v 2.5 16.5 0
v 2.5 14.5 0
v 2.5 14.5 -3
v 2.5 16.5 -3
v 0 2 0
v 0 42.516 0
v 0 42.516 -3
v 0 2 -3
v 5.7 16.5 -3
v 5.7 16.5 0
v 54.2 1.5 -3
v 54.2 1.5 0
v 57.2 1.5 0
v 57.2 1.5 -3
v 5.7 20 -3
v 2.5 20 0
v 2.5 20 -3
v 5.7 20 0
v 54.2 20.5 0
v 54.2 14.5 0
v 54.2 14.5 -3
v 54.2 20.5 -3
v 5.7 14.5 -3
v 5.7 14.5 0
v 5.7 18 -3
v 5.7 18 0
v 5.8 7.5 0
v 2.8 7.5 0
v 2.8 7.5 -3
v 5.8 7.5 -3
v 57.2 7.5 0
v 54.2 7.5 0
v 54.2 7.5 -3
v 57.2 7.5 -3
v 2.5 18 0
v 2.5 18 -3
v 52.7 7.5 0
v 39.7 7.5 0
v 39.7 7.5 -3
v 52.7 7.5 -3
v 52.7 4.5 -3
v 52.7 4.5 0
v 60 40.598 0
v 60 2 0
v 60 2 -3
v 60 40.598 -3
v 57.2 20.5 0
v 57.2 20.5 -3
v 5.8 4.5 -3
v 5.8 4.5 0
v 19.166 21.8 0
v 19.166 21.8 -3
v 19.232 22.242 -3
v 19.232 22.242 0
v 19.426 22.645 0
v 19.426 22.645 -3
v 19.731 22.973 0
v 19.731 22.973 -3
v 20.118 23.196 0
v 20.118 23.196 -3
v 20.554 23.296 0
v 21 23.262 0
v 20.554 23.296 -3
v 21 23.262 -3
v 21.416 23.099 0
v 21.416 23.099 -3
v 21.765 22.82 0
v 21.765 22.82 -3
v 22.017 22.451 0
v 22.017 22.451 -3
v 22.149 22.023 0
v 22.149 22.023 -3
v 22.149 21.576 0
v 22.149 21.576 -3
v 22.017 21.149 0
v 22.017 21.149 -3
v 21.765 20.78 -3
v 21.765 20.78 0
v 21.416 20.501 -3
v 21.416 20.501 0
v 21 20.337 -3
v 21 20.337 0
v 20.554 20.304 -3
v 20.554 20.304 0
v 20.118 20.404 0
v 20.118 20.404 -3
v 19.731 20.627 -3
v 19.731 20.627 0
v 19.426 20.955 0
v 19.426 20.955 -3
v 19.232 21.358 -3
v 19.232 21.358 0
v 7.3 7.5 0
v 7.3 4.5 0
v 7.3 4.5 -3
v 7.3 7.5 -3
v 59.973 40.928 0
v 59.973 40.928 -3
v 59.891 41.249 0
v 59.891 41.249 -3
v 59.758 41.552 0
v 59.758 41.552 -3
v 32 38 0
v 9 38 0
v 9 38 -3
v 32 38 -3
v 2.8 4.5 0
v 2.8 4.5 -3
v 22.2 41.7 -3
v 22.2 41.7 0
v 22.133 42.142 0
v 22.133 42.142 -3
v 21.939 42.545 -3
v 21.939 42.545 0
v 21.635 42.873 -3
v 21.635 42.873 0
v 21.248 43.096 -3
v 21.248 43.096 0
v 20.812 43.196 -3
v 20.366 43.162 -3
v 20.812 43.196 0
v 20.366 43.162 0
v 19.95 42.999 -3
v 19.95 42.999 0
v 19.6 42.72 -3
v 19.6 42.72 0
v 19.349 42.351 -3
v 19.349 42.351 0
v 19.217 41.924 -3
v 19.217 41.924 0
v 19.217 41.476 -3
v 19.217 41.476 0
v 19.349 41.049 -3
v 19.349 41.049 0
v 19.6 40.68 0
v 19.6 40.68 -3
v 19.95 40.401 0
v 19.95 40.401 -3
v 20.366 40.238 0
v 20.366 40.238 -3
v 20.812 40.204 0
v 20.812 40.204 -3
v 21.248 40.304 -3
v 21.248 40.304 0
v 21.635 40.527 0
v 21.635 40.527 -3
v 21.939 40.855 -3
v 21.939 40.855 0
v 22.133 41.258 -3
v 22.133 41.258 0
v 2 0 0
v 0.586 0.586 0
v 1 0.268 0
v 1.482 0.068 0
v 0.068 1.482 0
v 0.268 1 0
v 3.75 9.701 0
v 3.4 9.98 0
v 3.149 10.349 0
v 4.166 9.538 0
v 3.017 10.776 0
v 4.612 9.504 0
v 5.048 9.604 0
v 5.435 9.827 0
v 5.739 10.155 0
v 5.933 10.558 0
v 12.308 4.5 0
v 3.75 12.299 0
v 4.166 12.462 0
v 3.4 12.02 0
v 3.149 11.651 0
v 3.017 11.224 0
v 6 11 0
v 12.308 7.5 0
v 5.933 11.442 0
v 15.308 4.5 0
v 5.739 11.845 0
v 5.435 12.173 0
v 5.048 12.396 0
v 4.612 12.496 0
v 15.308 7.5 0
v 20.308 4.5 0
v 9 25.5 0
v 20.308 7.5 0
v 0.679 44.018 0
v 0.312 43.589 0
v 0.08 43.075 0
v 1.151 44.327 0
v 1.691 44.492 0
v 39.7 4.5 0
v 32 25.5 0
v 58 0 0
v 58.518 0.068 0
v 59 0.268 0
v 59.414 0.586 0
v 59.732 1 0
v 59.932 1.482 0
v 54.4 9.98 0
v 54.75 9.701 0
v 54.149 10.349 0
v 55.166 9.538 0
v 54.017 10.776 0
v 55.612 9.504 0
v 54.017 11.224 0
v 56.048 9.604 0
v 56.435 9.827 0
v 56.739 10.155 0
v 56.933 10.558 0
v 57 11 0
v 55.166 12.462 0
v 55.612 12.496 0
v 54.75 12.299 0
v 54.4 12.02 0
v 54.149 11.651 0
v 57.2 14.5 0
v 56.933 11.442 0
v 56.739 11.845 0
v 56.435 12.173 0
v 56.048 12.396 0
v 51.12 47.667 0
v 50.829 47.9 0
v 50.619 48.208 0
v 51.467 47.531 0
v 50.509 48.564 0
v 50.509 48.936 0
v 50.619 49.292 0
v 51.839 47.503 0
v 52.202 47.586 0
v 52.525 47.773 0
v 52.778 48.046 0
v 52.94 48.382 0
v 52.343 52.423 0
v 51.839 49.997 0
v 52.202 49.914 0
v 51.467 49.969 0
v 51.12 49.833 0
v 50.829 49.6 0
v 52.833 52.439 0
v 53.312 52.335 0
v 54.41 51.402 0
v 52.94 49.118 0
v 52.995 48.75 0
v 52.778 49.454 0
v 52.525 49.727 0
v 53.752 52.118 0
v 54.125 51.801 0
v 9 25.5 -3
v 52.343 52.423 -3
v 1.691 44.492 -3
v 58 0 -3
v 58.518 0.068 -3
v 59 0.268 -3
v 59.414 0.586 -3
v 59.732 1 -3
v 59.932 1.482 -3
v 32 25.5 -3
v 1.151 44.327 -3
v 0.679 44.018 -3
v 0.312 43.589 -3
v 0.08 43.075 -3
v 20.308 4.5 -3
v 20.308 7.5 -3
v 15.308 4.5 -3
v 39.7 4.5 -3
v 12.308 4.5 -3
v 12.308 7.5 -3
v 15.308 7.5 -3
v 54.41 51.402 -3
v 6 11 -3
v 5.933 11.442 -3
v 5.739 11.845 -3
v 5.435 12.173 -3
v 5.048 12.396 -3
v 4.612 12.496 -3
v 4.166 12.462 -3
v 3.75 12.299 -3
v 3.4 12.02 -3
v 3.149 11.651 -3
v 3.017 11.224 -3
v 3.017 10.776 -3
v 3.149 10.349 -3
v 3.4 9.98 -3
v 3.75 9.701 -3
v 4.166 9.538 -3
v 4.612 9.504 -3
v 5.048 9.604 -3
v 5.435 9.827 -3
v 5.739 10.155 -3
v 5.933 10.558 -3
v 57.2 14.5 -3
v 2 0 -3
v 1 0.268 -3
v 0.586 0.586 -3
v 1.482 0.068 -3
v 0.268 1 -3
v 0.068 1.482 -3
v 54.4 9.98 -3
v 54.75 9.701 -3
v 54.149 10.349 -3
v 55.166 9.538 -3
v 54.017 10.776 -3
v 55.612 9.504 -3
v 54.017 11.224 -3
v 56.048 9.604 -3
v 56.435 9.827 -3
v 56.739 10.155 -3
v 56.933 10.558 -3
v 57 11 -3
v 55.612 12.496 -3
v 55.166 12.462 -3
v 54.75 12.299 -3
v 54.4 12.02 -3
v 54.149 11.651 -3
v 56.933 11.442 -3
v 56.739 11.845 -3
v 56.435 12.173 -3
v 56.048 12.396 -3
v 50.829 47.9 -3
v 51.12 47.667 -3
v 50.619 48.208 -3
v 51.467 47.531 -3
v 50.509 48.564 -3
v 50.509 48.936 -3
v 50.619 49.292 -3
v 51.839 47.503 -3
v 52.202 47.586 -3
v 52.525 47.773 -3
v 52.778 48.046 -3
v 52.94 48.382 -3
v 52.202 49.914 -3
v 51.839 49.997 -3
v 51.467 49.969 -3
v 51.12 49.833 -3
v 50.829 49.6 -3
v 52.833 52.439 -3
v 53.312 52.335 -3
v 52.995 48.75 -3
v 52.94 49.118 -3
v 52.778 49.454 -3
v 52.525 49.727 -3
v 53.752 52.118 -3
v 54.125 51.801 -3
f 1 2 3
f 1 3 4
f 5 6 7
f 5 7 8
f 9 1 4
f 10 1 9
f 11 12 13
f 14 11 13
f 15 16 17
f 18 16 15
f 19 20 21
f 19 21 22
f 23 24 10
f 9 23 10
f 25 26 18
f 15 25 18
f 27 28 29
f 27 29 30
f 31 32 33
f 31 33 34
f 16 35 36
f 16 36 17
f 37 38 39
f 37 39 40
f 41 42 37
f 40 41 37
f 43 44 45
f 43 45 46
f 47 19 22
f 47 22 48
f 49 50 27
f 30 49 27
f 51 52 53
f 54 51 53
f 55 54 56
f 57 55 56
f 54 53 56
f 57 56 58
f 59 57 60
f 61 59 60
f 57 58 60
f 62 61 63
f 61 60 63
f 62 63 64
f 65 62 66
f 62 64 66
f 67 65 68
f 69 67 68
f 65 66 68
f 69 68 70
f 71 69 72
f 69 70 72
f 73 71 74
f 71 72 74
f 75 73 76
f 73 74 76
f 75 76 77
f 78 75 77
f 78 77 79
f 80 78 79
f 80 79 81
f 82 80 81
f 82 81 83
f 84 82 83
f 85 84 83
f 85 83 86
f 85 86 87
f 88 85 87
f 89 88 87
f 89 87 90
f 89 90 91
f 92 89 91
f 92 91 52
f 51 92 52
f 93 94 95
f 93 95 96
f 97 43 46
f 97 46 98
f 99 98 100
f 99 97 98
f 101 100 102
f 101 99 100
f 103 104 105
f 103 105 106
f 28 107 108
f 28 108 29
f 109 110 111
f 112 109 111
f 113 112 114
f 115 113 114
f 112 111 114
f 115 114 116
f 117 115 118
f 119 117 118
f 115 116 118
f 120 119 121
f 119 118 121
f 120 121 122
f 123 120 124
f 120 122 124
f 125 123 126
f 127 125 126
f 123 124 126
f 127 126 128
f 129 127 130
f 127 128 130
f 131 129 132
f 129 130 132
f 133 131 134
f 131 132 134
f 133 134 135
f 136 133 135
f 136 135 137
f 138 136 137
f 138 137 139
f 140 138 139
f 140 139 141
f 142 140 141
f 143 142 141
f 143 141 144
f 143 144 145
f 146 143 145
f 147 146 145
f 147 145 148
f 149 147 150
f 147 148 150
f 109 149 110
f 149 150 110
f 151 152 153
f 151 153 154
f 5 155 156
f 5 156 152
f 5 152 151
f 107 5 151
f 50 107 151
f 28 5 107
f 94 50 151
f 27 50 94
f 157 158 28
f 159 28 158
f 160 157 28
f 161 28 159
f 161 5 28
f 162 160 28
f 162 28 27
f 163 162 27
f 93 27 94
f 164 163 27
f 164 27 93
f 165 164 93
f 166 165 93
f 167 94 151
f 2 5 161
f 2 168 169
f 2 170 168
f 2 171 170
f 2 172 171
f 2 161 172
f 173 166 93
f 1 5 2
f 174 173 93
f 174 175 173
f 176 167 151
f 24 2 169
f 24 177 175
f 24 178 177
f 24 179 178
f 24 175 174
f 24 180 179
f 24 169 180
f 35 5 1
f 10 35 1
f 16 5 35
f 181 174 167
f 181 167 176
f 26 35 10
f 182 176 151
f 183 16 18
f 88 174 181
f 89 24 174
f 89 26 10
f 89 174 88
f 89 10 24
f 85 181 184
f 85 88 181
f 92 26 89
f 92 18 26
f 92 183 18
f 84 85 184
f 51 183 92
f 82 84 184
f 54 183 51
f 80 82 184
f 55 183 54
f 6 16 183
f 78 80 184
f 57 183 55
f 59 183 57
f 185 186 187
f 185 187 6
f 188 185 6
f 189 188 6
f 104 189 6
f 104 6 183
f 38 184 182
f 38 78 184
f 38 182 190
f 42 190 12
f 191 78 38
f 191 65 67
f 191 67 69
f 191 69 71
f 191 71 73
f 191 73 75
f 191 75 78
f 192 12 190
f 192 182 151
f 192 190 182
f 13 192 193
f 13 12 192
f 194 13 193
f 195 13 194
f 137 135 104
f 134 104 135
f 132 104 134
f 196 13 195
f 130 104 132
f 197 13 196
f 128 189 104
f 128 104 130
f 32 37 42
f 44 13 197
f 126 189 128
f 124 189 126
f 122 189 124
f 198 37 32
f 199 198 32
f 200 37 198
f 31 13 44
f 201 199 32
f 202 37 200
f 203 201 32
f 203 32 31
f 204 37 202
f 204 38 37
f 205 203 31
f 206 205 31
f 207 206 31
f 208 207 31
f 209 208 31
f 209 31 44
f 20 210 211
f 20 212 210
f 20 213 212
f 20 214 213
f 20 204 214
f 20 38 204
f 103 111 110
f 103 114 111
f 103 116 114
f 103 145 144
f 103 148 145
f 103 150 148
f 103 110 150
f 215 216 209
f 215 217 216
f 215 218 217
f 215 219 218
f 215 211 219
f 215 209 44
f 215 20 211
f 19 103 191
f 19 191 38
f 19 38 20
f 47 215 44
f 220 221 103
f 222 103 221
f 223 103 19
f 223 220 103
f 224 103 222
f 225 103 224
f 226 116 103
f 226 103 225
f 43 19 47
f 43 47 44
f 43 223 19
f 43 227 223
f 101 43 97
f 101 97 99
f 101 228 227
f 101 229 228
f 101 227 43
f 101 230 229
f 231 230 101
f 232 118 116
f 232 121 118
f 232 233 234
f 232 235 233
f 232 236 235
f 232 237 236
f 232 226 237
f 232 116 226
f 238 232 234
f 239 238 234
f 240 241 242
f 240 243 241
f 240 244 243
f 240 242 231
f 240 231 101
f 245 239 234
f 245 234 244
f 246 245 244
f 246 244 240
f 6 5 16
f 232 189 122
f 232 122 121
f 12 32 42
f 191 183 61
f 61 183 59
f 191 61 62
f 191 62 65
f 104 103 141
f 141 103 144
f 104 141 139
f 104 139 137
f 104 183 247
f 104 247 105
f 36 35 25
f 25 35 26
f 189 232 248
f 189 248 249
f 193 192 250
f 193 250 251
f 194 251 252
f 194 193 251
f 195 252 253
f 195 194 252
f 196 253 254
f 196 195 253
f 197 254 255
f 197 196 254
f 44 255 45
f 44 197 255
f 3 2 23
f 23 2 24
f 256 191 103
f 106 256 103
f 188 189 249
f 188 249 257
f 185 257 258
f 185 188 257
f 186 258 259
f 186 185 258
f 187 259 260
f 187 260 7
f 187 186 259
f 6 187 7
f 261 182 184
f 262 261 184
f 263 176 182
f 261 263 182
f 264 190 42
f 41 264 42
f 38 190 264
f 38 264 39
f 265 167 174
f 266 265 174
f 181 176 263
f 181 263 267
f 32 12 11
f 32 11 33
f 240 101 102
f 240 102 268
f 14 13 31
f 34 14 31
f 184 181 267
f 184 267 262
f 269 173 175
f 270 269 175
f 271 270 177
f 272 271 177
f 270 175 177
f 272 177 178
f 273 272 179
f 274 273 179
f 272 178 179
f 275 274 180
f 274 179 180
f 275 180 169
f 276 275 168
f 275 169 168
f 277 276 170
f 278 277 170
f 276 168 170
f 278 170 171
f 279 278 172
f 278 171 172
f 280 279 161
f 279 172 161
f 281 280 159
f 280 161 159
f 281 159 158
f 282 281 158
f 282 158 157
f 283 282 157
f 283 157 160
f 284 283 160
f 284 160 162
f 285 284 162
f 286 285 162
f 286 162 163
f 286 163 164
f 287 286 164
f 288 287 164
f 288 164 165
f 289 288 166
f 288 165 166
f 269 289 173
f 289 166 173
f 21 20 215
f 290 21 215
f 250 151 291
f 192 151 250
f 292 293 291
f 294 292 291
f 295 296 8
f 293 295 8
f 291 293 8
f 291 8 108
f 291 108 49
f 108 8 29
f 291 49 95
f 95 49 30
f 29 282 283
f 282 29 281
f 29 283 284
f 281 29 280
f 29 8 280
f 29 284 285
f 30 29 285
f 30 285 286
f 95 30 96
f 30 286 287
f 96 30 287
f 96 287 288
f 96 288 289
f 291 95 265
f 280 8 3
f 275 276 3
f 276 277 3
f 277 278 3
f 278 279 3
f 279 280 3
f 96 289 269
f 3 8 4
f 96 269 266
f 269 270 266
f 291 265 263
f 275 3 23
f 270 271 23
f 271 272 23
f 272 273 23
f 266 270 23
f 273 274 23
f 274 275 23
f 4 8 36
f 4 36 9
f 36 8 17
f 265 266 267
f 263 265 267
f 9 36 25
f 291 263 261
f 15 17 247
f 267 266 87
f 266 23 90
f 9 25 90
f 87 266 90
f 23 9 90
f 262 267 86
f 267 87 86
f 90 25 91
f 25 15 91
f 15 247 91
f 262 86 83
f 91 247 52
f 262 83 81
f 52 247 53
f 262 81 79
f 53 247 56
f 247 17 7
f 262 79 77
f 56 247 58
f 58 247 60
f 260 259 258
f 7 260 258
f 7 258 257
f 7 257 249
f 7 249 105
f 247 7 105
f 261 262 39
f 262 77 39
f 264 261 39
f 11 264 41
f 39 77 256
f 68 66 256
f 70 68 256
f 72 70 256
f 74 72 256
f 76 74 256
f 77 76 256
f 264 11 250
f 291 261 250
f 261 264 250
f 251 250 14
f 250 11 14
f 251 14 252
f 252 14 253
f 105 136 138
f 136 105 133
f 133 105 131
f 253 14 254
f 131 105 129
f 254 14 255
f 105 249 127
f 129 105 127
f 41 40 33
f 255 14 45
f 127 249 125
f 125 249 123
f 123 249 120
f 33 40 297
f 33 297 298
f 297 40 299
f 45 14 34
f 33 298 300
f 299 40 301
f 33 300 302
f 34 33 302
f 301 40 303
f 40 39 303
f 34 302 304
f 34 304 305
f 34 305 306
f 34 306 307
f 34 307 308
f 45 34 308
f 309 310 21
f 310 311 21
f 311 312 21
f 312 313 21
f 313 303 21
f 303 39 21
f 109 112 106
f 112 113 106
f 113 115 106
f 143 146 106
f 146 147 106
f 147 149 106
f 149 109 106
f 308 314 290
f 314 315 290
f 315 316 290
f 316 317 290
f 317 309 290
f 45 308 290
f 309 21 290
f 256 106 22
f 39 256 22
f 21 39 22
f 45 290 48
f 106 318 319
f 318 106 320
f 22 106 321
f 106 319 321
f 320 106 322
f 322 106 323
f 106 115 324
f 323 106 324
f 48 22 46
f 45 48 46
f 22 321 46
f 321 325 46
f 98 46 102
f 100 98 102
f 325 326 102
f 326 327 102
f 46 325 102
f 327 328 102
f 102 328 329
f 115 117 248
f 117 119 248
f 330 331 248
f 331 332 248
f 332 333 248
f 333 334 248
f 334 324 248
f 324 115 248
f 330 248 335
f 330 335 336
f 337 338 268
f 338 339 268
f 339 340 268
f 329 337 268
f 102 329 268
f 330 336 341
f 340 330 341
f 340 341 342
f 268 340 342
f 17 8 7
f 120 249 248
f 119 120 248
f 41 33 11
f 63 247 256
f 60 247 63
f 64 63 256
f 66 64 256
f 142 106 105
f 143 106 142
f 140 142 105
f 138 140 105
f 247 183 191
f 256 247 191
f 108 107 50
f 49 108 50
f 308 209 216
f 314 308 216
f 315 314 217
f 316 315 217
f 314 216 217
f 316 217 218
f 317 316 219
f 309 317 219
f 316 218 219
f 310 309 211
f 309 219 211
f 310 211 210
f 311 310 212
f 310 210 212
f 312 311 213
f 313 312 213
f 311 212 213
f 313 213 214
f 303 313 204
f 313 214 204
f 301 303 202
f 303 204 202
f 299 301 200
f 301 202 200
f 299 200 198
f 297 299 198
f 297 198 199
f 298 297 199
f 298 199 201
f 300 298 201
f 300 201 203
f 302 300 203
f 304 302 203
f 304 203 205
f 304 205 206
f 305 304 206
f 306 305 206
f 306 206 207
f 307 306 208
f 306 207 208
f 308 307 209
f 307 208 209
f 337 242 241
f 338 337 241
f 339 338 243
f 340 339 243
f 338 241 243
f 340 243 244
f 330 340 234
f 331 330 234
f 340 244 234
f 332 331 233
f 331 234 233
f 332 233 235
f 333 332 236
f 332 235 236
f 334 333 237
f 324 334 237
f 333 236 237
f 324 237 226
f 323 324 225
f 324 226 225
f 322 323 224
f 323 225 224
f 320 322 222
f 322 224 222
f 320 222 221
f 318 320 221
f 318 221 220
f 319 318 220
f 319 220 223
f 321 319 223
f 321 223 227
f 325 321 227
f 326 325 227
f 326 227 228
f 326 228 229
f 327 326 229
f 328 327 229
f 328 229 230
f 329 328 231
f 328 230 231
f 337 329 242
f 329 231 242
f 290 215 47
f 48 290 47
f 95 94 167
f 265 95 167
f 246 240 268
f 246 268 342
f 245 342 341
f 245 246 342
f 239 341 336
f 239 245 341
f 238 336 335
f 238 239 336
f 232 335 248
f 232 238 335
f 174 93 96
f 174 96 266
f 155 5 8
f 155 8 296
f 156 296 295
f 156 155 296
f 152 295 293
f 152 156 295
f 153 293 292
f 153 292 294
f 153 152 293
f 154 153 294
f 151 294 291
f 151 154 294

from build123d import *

# Parameters (mm, degrees)
ESQUISSE1_R               = 1.25
ESQUISSE1_R_2             = 1.5
ESQUISSE1_W               = 23
ESQUISSE1_H               = 12.5
ESQUISSE1_W_2             = 13
ESQUISSE1_H_2             = 3
ESQUISSE1_W_3             = 3
ESQUISSE1_H_3             = 6
ESQUISSE1_W_4             = 5
ESQUISSE1_W_5             = 5.008466432
ESQUISSE1_W_6             = 3.2
ESQUISSE1_H_4             = 2
T_LE_DE_BASE_PLI_E1_DEPTH = 3
ESQUISSE2_R               = 1.5
ENL_V_MAT_EXTRU_1_DEPTH   = 10


# Sheet-metal steps are written as plain solids
with BuildPart() as part:
    # Esquisse1 → Tôle de base pliée1 (new body)
    with BuildSketch(Plane.XY):
        with BuildLine():
            Line((0, 42.516223037), (0, 2))
            ThreePointArc((0, 2), (0.585786438, 0.585786438), (2, 0))
            Line((2, 0), (58, 0))
            ThreePointArc((58, 0), (59.414213562, 0.585786438), (60, 2))
            Line((60, 2), (60, 40.598160001))
            ThreePointArc((60, 40.598160001), (59.938461819, 41.090466587), (59.757634225, 41.552477522))
            Line((59.757634225, 41.552477522), (54.409971269, 51.401647463))
            ThreePointArc((54.409971269, 51.401647463), (53.538493891, 52.240295654), (52.342948156, 52.423254667))
            Line((52.342948156, 52.423254667), (1.690611112, 44.492147761))
            ThreePointArc((1.690611112, 44.492147761), (0.480332639, 43.816458059), (0, 42.516223037))
        make_face()
        with Locations((51.745273693, 48.75)):
            Circle(ESQUISSE1_R, mode=Mode.SUBTRACT)
        with Locations((20.7, 41.7)):
            Circle(ESQUISSE1_R_2, mode=Mode.SUBTRACT)
        with Locations((4.5, 11)):
            Circle(ESQUISSE1_R_2, mode=Mode.SUBTRACT)
        with Locations((55.5, 11)):
            Circle(ESQUISSE1_R_2, mode=Mode.SUBTRACT)
        with Locations((20.5, 31.75)):
            Rectangle(ESQUISSE1_W, ESQUISSE1_H, mode=Mode.SUBTRACT)
        with Locations((46.2, 6)):
            Rectangle(ESQUISSE1_W_2, ESQUISSE1_H_2, mode=Mode.SUBTRACT)
        with Locations((55.7, 4.5)):
            Rectangle(ESQUISSE1_W_3, ESQUISSE1_H_3, mode=Mode.SUBTRACT)
        with Locations((55.7, 17.5)):
            Rectangle(ESQUISSE1_W_3, ESQUISSE1_H_3, mode=Mode.SUBTRACT)
        with Locations((17.808466432, 6)):
            Rectangle(ESQUISSE1_W_4, ESQUISSE1_H_2, mode=Mode.SUBTRACT)
        with Locations((9.804233216, 6)):
            Rectangle(ESQUISSE1_W_5, ESQUISSE1_H_2, mode=Mode.SUBTRACT)
        with Locations((4.3, 6)):
            Rectangle(ESQUISSE1_W_3, ESQUISSE1_H_2, mode=Mode.SUBTRACT)
        with Locations((4.1, 15.5)):
            Rectangle(ESQUISSE1_W_6, ESQUISSE1_H_4, mode=Mode.SUBTRACT)
        with Locations((4.1, 19)):
            Rectangle(ESQUISSE1_W_6, ESQUISSE1_H_4, mode=Mode.SUBTRACT)
    extrude(amount=-T_LE_DE_BASE_PLI_E1_DEPTH)

    # Esquisse2 → Enlèv. mat.-Extru.1 (cut)
    with BuildSketch(Plane(origin=(0, 0, -3), x_dir=(-1, 0, 0), z_dir=(0, 0, -1))):
        with Locations((-20.66577155, 21.799816522)):
            Circle(ESQUISSE2_R)
    extrude(amount=-ENL_V_MAT_EXTRU_1_DEPTH, mode=Mode.SUBTRACT)


solid = part.part
